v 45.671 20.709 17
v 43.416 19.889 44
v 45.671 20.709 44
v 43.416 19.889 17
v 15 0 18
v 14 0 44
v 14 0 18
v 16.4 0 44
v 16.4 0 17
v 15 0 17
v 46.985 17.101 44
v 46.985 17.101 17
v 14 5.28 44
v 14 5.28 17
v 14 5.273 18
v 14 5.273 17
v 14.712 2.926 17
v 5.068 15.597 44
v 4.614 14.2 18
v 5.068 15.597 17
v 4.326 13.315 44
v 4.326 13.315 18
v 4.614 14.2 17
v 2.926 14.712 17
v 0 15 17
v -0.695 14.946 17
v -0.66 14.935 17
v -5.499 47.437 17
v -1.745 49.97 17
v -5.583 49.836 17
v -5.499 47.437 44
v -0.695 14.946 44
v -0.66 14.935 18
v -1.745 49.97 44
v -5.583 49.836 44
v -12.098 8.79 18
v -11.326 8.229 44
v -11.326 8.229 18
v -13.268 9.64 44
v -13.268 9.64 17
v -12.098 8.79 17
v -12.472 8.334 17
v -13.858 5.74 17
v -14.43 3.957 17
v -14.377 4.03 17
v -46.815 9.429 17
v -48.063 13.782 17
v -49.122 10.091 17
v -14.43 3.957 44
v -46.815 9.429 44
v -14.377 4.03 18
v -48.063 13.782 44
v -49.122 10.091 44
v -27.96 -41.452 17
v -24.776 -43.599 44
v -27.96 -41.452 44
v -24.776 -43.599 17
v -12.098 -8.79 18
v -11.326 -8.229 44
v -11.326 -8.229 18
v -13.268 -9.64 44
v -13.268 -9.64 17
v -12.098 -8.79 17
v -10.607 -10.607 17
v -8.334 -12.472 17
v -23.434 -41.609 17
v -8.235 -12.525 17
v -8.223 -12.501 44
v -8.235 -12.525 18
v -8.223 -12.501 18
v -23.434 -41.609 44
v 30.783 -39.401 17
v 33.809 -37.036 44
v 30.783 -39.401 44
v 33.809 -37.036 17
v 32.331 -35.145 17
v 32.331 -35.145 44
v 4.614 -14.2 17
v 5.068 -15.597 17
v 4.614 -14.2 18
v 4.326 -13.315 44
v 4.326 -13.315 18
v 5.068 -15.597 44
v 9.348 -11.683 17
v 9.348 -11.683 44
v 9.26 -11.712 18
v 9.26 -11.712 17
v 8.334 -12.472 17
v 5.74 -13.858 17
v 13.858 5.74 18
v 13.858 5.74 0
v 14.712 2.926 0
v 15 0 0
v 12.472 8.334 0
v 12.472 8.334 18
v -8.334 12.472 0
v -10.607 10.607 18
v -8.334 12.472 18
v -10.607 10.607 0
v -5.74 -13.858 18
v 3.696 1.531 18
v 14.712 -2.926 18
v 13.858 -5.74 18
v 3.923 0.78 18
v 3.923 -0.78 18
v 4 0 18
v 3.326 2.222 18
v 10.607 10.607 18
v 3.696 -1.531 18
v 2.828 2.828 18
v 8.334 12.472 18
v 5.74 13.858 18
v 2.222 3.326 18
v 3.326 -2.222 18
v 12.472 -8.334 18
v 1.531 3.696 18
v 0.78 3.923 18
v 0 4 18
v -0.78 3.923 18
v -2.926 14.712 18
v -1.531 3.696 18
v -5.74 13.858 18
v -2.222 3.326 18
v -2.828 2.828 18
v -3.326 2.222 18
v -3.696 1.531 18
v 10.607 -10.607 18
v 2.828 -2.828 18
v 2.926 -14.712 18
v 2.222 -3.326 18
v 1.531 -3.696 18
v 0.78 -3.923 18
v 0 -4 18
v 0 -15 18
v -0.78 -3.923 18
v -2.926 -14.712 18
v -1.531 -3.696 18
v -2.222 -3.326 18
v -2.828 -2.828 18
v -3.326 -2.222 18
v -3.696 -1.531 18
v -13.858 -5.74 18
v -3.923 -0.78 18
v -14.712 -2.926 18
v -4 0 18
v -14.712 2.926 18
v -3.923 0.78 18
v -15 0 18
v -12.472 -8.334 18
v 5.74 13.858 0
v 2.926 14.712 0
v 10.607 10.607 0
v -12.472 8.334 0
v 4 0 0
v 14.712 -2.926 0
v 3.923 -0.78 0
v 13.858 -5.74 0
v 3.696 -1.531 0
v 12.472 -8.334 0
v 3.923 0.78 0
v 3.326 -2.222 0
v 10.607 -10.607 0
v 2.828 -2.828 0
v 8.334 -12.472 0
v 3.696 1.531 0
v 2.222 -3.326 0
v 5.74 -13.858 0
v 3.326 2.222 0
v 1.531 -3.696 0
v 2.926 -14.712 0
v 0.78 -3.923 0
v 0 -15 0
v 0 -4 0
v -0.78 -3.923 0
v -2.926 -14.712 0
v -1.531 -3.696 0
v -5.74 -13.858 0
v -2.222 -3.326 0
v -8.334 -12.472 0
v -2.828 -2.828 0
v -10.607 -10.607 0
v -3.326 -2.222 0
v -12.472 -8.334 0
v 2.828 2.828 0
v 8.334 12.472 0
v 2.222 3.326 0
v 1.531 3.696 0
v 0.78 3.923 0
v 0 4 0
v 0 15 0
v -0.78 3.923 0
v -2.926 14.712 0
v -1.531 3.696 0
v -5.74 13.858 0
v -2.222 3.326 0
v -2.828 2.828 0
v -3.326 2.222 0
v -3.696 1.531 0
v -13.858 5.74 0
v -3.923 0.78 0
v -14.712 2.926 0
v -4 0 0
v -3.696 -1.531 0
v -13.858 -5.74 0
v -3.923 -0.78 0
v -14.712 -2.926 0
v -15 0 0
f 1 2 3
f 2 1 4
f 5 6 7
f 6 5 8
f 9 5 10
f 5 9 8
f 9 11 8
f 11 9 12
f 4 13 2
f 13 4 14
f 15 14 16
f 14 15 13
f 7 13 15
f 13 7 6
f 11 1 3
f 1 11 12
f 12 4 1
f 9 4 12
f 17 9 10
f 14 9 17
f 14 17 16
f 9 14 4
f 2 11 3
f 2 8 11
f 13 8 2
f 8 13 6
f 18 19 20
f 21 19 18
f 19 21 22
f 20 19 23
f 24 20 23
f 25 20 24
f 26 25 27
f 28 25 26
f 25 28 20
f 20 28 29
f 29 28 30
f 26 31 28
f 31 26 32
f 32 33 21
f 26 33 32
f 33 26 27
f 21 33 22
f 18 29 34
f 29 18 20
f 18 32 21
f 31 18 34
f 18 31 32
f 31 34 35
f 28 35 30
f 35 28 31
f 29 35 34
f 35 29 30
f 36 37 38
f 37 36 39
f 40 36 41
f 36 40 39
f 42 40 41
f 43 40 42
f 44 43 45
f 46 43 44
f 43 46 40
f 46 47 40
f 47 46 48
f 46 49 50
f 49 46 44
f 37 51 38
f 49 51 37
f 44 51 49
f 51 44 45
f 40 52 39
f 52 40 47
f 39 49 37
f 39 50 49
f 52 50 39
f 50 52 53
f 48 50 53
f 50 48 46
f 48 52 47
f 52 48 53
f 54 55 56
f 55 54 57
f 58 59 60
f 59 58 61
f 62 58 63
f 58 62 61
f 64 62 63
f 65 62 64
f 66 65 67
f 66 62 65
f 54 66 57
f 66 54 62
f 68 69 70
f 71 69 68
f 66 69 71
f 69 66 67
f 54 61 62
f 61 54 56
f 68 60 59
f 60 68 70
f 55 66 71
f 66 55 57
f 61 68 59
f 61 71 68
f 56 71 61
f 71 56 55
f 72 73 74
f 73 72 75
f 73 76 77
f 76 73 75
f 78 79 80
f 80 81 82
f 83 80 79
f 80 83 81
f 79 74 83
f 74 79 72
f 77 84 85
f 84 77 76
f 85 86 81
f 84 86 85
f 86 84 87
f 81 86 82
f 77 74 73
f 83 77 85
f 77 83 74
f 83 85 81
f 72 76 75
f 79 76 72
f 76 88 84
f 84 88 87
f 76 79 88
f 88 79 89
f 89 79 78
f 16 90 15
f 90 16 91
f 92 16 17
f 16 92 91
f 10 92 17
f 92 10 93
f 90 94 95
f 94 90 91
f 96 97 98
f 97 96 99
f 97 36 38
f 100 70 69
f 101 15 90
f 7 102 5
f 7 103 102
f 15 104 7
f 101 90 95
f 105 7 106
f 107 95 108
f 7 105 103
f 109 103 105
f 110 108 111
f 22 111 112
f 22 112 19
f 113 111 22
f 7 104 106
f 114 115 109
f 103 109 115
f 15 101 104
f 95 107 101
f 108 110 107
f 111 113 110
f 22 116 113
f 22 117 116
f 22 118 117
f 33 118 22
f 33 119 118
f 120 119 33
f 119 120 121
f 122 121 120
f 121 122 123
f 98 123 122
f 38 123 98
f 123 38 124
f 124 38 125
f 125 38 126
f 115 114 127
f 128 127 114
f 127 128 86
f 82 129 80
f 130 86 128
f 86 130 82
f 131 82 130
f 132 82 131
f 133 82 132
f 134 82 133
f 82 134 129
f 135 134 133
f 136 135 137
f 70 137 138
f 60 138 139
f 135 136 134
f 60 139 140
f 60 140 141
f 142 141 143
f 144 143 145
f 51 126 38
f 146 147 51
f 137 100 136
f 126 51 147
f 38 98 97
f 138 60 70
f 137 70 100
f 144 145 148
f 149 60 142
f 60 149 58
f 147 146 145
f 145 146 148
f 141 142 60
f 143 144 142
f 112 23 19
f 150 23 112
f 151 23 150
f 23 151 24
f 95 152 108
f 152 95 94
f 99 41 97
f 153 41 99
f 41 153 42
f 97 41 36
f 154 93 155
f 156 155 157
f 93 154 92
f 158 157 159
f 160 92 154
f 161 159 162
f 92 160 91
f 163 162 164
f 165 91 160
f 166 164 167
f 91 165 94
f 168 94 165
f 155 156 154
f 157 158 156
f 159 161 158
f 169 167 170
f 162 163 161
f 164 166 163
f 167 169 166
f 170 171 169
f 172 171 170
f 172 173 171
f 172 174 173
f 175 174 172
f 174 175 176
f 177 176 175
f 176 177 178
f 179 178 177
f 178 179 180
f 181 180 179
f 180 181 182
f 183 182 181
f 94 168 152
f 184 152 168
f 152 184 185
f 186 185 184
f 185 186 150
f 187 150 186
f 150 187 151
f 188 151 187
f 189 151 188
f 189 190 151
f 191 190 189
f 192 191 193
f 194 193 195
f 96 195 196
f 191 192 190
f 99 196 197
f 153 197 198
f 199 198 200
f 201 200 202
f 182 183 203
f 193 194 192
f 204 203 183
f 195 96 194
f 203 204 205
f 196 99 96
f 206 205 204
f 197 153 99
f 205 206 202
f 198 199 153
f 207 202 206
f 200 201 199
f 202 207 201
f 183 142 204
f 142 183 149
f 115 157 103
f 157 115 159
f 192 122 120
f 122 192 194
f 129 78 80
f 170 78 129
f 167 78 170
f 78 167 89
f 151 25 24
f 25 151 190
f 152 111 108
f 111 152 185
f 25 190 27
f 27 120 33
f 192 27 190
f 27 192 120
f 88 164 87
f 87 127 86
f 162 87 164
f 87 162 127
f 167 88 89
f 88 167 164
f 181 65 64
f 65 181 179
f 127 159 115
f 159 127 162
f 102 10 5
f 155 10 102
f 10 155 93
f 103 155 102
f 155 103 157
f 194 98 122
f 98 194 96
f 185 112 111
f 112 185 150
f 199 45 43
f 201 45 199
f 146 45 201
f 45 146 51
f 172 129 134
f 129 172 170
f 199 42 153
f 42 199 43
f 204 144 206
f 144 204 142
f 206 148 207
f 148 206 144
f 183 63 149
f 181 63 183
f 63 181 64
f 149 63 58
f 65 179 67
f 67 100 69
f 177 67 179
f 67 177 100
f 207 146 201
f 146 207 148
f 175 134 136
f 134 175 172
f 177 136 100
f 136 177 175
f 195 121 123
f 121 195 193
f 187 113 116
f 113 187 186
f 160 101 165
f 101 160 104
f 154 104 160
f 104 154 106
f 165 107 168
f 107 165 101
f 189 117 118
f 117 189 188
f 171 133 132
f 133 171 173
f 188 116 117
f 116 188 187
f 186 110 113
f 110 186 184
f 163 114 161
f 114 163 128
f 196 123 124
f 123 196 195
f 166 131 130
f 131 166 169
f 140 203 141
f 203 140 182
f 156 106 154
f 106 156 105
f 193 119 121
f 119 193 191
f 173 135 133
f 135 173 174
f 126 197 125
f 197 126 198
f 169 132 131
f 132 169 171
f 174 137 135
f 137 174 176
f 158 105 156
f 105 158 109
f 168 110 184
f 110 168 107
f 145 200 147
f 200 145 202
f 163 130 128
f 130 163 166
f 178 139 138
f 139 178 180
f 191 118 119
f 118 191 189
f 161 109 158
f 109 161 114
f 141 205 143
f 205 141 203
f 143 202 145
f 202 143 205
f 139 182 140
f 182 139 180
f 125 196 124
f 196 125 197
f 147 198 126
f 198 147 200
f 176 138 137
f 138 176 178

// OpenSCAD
$fn = 32;

// ----------------------------------------------------------------------
// Impeller: 100 mm, 5 blades, 44 mm tall
// ----------------------------------------------------------------------

// --- parameters (mm) ---
center_d = 30;            // hub diameter
center_h = 18;            // hub height
wheel_d = 100;            // outer diameter over the blades
blade_count = 5;          // number of blades
blade_t = 2.4;            // blade thickness
blade_h = 26;             // blade height
blade_in_r = 14;          // blade root radius
blade_out_r = 47.6;       // blade tip radius
sweep = 20;               // blade sweep, degrees
bore_d = 8;               // shaft bore

module hub() {
  cylinder(h = center_h, d = center_d);
}

module blade() {
  /* blade swept between two boxes: hull of the root and the tip section */
  hull() {
    translate([blade_in_r, 0, center_h - 1])
      cube([blade_t, blade_t * 2.2, blade_h + 1], center = false);
    rotate([0, 0, sweep])
      translate([blade_out_r, 0, center_h - 1])
        cube([blade_t, blade_t * 1.6, blade_h + 1], center = false);
  }
}

module blades() {
  for (i = [0 : blade_count - 1])
    rotate([0, 0, i * 360 / blade_count]) blade();
}

difference() {
  union() {
    hub();
    blades();
  }
  translate([0, 0, -1]) cylinder(h = center_h + blade_h + 0 + 3, d = bore_d);
}
